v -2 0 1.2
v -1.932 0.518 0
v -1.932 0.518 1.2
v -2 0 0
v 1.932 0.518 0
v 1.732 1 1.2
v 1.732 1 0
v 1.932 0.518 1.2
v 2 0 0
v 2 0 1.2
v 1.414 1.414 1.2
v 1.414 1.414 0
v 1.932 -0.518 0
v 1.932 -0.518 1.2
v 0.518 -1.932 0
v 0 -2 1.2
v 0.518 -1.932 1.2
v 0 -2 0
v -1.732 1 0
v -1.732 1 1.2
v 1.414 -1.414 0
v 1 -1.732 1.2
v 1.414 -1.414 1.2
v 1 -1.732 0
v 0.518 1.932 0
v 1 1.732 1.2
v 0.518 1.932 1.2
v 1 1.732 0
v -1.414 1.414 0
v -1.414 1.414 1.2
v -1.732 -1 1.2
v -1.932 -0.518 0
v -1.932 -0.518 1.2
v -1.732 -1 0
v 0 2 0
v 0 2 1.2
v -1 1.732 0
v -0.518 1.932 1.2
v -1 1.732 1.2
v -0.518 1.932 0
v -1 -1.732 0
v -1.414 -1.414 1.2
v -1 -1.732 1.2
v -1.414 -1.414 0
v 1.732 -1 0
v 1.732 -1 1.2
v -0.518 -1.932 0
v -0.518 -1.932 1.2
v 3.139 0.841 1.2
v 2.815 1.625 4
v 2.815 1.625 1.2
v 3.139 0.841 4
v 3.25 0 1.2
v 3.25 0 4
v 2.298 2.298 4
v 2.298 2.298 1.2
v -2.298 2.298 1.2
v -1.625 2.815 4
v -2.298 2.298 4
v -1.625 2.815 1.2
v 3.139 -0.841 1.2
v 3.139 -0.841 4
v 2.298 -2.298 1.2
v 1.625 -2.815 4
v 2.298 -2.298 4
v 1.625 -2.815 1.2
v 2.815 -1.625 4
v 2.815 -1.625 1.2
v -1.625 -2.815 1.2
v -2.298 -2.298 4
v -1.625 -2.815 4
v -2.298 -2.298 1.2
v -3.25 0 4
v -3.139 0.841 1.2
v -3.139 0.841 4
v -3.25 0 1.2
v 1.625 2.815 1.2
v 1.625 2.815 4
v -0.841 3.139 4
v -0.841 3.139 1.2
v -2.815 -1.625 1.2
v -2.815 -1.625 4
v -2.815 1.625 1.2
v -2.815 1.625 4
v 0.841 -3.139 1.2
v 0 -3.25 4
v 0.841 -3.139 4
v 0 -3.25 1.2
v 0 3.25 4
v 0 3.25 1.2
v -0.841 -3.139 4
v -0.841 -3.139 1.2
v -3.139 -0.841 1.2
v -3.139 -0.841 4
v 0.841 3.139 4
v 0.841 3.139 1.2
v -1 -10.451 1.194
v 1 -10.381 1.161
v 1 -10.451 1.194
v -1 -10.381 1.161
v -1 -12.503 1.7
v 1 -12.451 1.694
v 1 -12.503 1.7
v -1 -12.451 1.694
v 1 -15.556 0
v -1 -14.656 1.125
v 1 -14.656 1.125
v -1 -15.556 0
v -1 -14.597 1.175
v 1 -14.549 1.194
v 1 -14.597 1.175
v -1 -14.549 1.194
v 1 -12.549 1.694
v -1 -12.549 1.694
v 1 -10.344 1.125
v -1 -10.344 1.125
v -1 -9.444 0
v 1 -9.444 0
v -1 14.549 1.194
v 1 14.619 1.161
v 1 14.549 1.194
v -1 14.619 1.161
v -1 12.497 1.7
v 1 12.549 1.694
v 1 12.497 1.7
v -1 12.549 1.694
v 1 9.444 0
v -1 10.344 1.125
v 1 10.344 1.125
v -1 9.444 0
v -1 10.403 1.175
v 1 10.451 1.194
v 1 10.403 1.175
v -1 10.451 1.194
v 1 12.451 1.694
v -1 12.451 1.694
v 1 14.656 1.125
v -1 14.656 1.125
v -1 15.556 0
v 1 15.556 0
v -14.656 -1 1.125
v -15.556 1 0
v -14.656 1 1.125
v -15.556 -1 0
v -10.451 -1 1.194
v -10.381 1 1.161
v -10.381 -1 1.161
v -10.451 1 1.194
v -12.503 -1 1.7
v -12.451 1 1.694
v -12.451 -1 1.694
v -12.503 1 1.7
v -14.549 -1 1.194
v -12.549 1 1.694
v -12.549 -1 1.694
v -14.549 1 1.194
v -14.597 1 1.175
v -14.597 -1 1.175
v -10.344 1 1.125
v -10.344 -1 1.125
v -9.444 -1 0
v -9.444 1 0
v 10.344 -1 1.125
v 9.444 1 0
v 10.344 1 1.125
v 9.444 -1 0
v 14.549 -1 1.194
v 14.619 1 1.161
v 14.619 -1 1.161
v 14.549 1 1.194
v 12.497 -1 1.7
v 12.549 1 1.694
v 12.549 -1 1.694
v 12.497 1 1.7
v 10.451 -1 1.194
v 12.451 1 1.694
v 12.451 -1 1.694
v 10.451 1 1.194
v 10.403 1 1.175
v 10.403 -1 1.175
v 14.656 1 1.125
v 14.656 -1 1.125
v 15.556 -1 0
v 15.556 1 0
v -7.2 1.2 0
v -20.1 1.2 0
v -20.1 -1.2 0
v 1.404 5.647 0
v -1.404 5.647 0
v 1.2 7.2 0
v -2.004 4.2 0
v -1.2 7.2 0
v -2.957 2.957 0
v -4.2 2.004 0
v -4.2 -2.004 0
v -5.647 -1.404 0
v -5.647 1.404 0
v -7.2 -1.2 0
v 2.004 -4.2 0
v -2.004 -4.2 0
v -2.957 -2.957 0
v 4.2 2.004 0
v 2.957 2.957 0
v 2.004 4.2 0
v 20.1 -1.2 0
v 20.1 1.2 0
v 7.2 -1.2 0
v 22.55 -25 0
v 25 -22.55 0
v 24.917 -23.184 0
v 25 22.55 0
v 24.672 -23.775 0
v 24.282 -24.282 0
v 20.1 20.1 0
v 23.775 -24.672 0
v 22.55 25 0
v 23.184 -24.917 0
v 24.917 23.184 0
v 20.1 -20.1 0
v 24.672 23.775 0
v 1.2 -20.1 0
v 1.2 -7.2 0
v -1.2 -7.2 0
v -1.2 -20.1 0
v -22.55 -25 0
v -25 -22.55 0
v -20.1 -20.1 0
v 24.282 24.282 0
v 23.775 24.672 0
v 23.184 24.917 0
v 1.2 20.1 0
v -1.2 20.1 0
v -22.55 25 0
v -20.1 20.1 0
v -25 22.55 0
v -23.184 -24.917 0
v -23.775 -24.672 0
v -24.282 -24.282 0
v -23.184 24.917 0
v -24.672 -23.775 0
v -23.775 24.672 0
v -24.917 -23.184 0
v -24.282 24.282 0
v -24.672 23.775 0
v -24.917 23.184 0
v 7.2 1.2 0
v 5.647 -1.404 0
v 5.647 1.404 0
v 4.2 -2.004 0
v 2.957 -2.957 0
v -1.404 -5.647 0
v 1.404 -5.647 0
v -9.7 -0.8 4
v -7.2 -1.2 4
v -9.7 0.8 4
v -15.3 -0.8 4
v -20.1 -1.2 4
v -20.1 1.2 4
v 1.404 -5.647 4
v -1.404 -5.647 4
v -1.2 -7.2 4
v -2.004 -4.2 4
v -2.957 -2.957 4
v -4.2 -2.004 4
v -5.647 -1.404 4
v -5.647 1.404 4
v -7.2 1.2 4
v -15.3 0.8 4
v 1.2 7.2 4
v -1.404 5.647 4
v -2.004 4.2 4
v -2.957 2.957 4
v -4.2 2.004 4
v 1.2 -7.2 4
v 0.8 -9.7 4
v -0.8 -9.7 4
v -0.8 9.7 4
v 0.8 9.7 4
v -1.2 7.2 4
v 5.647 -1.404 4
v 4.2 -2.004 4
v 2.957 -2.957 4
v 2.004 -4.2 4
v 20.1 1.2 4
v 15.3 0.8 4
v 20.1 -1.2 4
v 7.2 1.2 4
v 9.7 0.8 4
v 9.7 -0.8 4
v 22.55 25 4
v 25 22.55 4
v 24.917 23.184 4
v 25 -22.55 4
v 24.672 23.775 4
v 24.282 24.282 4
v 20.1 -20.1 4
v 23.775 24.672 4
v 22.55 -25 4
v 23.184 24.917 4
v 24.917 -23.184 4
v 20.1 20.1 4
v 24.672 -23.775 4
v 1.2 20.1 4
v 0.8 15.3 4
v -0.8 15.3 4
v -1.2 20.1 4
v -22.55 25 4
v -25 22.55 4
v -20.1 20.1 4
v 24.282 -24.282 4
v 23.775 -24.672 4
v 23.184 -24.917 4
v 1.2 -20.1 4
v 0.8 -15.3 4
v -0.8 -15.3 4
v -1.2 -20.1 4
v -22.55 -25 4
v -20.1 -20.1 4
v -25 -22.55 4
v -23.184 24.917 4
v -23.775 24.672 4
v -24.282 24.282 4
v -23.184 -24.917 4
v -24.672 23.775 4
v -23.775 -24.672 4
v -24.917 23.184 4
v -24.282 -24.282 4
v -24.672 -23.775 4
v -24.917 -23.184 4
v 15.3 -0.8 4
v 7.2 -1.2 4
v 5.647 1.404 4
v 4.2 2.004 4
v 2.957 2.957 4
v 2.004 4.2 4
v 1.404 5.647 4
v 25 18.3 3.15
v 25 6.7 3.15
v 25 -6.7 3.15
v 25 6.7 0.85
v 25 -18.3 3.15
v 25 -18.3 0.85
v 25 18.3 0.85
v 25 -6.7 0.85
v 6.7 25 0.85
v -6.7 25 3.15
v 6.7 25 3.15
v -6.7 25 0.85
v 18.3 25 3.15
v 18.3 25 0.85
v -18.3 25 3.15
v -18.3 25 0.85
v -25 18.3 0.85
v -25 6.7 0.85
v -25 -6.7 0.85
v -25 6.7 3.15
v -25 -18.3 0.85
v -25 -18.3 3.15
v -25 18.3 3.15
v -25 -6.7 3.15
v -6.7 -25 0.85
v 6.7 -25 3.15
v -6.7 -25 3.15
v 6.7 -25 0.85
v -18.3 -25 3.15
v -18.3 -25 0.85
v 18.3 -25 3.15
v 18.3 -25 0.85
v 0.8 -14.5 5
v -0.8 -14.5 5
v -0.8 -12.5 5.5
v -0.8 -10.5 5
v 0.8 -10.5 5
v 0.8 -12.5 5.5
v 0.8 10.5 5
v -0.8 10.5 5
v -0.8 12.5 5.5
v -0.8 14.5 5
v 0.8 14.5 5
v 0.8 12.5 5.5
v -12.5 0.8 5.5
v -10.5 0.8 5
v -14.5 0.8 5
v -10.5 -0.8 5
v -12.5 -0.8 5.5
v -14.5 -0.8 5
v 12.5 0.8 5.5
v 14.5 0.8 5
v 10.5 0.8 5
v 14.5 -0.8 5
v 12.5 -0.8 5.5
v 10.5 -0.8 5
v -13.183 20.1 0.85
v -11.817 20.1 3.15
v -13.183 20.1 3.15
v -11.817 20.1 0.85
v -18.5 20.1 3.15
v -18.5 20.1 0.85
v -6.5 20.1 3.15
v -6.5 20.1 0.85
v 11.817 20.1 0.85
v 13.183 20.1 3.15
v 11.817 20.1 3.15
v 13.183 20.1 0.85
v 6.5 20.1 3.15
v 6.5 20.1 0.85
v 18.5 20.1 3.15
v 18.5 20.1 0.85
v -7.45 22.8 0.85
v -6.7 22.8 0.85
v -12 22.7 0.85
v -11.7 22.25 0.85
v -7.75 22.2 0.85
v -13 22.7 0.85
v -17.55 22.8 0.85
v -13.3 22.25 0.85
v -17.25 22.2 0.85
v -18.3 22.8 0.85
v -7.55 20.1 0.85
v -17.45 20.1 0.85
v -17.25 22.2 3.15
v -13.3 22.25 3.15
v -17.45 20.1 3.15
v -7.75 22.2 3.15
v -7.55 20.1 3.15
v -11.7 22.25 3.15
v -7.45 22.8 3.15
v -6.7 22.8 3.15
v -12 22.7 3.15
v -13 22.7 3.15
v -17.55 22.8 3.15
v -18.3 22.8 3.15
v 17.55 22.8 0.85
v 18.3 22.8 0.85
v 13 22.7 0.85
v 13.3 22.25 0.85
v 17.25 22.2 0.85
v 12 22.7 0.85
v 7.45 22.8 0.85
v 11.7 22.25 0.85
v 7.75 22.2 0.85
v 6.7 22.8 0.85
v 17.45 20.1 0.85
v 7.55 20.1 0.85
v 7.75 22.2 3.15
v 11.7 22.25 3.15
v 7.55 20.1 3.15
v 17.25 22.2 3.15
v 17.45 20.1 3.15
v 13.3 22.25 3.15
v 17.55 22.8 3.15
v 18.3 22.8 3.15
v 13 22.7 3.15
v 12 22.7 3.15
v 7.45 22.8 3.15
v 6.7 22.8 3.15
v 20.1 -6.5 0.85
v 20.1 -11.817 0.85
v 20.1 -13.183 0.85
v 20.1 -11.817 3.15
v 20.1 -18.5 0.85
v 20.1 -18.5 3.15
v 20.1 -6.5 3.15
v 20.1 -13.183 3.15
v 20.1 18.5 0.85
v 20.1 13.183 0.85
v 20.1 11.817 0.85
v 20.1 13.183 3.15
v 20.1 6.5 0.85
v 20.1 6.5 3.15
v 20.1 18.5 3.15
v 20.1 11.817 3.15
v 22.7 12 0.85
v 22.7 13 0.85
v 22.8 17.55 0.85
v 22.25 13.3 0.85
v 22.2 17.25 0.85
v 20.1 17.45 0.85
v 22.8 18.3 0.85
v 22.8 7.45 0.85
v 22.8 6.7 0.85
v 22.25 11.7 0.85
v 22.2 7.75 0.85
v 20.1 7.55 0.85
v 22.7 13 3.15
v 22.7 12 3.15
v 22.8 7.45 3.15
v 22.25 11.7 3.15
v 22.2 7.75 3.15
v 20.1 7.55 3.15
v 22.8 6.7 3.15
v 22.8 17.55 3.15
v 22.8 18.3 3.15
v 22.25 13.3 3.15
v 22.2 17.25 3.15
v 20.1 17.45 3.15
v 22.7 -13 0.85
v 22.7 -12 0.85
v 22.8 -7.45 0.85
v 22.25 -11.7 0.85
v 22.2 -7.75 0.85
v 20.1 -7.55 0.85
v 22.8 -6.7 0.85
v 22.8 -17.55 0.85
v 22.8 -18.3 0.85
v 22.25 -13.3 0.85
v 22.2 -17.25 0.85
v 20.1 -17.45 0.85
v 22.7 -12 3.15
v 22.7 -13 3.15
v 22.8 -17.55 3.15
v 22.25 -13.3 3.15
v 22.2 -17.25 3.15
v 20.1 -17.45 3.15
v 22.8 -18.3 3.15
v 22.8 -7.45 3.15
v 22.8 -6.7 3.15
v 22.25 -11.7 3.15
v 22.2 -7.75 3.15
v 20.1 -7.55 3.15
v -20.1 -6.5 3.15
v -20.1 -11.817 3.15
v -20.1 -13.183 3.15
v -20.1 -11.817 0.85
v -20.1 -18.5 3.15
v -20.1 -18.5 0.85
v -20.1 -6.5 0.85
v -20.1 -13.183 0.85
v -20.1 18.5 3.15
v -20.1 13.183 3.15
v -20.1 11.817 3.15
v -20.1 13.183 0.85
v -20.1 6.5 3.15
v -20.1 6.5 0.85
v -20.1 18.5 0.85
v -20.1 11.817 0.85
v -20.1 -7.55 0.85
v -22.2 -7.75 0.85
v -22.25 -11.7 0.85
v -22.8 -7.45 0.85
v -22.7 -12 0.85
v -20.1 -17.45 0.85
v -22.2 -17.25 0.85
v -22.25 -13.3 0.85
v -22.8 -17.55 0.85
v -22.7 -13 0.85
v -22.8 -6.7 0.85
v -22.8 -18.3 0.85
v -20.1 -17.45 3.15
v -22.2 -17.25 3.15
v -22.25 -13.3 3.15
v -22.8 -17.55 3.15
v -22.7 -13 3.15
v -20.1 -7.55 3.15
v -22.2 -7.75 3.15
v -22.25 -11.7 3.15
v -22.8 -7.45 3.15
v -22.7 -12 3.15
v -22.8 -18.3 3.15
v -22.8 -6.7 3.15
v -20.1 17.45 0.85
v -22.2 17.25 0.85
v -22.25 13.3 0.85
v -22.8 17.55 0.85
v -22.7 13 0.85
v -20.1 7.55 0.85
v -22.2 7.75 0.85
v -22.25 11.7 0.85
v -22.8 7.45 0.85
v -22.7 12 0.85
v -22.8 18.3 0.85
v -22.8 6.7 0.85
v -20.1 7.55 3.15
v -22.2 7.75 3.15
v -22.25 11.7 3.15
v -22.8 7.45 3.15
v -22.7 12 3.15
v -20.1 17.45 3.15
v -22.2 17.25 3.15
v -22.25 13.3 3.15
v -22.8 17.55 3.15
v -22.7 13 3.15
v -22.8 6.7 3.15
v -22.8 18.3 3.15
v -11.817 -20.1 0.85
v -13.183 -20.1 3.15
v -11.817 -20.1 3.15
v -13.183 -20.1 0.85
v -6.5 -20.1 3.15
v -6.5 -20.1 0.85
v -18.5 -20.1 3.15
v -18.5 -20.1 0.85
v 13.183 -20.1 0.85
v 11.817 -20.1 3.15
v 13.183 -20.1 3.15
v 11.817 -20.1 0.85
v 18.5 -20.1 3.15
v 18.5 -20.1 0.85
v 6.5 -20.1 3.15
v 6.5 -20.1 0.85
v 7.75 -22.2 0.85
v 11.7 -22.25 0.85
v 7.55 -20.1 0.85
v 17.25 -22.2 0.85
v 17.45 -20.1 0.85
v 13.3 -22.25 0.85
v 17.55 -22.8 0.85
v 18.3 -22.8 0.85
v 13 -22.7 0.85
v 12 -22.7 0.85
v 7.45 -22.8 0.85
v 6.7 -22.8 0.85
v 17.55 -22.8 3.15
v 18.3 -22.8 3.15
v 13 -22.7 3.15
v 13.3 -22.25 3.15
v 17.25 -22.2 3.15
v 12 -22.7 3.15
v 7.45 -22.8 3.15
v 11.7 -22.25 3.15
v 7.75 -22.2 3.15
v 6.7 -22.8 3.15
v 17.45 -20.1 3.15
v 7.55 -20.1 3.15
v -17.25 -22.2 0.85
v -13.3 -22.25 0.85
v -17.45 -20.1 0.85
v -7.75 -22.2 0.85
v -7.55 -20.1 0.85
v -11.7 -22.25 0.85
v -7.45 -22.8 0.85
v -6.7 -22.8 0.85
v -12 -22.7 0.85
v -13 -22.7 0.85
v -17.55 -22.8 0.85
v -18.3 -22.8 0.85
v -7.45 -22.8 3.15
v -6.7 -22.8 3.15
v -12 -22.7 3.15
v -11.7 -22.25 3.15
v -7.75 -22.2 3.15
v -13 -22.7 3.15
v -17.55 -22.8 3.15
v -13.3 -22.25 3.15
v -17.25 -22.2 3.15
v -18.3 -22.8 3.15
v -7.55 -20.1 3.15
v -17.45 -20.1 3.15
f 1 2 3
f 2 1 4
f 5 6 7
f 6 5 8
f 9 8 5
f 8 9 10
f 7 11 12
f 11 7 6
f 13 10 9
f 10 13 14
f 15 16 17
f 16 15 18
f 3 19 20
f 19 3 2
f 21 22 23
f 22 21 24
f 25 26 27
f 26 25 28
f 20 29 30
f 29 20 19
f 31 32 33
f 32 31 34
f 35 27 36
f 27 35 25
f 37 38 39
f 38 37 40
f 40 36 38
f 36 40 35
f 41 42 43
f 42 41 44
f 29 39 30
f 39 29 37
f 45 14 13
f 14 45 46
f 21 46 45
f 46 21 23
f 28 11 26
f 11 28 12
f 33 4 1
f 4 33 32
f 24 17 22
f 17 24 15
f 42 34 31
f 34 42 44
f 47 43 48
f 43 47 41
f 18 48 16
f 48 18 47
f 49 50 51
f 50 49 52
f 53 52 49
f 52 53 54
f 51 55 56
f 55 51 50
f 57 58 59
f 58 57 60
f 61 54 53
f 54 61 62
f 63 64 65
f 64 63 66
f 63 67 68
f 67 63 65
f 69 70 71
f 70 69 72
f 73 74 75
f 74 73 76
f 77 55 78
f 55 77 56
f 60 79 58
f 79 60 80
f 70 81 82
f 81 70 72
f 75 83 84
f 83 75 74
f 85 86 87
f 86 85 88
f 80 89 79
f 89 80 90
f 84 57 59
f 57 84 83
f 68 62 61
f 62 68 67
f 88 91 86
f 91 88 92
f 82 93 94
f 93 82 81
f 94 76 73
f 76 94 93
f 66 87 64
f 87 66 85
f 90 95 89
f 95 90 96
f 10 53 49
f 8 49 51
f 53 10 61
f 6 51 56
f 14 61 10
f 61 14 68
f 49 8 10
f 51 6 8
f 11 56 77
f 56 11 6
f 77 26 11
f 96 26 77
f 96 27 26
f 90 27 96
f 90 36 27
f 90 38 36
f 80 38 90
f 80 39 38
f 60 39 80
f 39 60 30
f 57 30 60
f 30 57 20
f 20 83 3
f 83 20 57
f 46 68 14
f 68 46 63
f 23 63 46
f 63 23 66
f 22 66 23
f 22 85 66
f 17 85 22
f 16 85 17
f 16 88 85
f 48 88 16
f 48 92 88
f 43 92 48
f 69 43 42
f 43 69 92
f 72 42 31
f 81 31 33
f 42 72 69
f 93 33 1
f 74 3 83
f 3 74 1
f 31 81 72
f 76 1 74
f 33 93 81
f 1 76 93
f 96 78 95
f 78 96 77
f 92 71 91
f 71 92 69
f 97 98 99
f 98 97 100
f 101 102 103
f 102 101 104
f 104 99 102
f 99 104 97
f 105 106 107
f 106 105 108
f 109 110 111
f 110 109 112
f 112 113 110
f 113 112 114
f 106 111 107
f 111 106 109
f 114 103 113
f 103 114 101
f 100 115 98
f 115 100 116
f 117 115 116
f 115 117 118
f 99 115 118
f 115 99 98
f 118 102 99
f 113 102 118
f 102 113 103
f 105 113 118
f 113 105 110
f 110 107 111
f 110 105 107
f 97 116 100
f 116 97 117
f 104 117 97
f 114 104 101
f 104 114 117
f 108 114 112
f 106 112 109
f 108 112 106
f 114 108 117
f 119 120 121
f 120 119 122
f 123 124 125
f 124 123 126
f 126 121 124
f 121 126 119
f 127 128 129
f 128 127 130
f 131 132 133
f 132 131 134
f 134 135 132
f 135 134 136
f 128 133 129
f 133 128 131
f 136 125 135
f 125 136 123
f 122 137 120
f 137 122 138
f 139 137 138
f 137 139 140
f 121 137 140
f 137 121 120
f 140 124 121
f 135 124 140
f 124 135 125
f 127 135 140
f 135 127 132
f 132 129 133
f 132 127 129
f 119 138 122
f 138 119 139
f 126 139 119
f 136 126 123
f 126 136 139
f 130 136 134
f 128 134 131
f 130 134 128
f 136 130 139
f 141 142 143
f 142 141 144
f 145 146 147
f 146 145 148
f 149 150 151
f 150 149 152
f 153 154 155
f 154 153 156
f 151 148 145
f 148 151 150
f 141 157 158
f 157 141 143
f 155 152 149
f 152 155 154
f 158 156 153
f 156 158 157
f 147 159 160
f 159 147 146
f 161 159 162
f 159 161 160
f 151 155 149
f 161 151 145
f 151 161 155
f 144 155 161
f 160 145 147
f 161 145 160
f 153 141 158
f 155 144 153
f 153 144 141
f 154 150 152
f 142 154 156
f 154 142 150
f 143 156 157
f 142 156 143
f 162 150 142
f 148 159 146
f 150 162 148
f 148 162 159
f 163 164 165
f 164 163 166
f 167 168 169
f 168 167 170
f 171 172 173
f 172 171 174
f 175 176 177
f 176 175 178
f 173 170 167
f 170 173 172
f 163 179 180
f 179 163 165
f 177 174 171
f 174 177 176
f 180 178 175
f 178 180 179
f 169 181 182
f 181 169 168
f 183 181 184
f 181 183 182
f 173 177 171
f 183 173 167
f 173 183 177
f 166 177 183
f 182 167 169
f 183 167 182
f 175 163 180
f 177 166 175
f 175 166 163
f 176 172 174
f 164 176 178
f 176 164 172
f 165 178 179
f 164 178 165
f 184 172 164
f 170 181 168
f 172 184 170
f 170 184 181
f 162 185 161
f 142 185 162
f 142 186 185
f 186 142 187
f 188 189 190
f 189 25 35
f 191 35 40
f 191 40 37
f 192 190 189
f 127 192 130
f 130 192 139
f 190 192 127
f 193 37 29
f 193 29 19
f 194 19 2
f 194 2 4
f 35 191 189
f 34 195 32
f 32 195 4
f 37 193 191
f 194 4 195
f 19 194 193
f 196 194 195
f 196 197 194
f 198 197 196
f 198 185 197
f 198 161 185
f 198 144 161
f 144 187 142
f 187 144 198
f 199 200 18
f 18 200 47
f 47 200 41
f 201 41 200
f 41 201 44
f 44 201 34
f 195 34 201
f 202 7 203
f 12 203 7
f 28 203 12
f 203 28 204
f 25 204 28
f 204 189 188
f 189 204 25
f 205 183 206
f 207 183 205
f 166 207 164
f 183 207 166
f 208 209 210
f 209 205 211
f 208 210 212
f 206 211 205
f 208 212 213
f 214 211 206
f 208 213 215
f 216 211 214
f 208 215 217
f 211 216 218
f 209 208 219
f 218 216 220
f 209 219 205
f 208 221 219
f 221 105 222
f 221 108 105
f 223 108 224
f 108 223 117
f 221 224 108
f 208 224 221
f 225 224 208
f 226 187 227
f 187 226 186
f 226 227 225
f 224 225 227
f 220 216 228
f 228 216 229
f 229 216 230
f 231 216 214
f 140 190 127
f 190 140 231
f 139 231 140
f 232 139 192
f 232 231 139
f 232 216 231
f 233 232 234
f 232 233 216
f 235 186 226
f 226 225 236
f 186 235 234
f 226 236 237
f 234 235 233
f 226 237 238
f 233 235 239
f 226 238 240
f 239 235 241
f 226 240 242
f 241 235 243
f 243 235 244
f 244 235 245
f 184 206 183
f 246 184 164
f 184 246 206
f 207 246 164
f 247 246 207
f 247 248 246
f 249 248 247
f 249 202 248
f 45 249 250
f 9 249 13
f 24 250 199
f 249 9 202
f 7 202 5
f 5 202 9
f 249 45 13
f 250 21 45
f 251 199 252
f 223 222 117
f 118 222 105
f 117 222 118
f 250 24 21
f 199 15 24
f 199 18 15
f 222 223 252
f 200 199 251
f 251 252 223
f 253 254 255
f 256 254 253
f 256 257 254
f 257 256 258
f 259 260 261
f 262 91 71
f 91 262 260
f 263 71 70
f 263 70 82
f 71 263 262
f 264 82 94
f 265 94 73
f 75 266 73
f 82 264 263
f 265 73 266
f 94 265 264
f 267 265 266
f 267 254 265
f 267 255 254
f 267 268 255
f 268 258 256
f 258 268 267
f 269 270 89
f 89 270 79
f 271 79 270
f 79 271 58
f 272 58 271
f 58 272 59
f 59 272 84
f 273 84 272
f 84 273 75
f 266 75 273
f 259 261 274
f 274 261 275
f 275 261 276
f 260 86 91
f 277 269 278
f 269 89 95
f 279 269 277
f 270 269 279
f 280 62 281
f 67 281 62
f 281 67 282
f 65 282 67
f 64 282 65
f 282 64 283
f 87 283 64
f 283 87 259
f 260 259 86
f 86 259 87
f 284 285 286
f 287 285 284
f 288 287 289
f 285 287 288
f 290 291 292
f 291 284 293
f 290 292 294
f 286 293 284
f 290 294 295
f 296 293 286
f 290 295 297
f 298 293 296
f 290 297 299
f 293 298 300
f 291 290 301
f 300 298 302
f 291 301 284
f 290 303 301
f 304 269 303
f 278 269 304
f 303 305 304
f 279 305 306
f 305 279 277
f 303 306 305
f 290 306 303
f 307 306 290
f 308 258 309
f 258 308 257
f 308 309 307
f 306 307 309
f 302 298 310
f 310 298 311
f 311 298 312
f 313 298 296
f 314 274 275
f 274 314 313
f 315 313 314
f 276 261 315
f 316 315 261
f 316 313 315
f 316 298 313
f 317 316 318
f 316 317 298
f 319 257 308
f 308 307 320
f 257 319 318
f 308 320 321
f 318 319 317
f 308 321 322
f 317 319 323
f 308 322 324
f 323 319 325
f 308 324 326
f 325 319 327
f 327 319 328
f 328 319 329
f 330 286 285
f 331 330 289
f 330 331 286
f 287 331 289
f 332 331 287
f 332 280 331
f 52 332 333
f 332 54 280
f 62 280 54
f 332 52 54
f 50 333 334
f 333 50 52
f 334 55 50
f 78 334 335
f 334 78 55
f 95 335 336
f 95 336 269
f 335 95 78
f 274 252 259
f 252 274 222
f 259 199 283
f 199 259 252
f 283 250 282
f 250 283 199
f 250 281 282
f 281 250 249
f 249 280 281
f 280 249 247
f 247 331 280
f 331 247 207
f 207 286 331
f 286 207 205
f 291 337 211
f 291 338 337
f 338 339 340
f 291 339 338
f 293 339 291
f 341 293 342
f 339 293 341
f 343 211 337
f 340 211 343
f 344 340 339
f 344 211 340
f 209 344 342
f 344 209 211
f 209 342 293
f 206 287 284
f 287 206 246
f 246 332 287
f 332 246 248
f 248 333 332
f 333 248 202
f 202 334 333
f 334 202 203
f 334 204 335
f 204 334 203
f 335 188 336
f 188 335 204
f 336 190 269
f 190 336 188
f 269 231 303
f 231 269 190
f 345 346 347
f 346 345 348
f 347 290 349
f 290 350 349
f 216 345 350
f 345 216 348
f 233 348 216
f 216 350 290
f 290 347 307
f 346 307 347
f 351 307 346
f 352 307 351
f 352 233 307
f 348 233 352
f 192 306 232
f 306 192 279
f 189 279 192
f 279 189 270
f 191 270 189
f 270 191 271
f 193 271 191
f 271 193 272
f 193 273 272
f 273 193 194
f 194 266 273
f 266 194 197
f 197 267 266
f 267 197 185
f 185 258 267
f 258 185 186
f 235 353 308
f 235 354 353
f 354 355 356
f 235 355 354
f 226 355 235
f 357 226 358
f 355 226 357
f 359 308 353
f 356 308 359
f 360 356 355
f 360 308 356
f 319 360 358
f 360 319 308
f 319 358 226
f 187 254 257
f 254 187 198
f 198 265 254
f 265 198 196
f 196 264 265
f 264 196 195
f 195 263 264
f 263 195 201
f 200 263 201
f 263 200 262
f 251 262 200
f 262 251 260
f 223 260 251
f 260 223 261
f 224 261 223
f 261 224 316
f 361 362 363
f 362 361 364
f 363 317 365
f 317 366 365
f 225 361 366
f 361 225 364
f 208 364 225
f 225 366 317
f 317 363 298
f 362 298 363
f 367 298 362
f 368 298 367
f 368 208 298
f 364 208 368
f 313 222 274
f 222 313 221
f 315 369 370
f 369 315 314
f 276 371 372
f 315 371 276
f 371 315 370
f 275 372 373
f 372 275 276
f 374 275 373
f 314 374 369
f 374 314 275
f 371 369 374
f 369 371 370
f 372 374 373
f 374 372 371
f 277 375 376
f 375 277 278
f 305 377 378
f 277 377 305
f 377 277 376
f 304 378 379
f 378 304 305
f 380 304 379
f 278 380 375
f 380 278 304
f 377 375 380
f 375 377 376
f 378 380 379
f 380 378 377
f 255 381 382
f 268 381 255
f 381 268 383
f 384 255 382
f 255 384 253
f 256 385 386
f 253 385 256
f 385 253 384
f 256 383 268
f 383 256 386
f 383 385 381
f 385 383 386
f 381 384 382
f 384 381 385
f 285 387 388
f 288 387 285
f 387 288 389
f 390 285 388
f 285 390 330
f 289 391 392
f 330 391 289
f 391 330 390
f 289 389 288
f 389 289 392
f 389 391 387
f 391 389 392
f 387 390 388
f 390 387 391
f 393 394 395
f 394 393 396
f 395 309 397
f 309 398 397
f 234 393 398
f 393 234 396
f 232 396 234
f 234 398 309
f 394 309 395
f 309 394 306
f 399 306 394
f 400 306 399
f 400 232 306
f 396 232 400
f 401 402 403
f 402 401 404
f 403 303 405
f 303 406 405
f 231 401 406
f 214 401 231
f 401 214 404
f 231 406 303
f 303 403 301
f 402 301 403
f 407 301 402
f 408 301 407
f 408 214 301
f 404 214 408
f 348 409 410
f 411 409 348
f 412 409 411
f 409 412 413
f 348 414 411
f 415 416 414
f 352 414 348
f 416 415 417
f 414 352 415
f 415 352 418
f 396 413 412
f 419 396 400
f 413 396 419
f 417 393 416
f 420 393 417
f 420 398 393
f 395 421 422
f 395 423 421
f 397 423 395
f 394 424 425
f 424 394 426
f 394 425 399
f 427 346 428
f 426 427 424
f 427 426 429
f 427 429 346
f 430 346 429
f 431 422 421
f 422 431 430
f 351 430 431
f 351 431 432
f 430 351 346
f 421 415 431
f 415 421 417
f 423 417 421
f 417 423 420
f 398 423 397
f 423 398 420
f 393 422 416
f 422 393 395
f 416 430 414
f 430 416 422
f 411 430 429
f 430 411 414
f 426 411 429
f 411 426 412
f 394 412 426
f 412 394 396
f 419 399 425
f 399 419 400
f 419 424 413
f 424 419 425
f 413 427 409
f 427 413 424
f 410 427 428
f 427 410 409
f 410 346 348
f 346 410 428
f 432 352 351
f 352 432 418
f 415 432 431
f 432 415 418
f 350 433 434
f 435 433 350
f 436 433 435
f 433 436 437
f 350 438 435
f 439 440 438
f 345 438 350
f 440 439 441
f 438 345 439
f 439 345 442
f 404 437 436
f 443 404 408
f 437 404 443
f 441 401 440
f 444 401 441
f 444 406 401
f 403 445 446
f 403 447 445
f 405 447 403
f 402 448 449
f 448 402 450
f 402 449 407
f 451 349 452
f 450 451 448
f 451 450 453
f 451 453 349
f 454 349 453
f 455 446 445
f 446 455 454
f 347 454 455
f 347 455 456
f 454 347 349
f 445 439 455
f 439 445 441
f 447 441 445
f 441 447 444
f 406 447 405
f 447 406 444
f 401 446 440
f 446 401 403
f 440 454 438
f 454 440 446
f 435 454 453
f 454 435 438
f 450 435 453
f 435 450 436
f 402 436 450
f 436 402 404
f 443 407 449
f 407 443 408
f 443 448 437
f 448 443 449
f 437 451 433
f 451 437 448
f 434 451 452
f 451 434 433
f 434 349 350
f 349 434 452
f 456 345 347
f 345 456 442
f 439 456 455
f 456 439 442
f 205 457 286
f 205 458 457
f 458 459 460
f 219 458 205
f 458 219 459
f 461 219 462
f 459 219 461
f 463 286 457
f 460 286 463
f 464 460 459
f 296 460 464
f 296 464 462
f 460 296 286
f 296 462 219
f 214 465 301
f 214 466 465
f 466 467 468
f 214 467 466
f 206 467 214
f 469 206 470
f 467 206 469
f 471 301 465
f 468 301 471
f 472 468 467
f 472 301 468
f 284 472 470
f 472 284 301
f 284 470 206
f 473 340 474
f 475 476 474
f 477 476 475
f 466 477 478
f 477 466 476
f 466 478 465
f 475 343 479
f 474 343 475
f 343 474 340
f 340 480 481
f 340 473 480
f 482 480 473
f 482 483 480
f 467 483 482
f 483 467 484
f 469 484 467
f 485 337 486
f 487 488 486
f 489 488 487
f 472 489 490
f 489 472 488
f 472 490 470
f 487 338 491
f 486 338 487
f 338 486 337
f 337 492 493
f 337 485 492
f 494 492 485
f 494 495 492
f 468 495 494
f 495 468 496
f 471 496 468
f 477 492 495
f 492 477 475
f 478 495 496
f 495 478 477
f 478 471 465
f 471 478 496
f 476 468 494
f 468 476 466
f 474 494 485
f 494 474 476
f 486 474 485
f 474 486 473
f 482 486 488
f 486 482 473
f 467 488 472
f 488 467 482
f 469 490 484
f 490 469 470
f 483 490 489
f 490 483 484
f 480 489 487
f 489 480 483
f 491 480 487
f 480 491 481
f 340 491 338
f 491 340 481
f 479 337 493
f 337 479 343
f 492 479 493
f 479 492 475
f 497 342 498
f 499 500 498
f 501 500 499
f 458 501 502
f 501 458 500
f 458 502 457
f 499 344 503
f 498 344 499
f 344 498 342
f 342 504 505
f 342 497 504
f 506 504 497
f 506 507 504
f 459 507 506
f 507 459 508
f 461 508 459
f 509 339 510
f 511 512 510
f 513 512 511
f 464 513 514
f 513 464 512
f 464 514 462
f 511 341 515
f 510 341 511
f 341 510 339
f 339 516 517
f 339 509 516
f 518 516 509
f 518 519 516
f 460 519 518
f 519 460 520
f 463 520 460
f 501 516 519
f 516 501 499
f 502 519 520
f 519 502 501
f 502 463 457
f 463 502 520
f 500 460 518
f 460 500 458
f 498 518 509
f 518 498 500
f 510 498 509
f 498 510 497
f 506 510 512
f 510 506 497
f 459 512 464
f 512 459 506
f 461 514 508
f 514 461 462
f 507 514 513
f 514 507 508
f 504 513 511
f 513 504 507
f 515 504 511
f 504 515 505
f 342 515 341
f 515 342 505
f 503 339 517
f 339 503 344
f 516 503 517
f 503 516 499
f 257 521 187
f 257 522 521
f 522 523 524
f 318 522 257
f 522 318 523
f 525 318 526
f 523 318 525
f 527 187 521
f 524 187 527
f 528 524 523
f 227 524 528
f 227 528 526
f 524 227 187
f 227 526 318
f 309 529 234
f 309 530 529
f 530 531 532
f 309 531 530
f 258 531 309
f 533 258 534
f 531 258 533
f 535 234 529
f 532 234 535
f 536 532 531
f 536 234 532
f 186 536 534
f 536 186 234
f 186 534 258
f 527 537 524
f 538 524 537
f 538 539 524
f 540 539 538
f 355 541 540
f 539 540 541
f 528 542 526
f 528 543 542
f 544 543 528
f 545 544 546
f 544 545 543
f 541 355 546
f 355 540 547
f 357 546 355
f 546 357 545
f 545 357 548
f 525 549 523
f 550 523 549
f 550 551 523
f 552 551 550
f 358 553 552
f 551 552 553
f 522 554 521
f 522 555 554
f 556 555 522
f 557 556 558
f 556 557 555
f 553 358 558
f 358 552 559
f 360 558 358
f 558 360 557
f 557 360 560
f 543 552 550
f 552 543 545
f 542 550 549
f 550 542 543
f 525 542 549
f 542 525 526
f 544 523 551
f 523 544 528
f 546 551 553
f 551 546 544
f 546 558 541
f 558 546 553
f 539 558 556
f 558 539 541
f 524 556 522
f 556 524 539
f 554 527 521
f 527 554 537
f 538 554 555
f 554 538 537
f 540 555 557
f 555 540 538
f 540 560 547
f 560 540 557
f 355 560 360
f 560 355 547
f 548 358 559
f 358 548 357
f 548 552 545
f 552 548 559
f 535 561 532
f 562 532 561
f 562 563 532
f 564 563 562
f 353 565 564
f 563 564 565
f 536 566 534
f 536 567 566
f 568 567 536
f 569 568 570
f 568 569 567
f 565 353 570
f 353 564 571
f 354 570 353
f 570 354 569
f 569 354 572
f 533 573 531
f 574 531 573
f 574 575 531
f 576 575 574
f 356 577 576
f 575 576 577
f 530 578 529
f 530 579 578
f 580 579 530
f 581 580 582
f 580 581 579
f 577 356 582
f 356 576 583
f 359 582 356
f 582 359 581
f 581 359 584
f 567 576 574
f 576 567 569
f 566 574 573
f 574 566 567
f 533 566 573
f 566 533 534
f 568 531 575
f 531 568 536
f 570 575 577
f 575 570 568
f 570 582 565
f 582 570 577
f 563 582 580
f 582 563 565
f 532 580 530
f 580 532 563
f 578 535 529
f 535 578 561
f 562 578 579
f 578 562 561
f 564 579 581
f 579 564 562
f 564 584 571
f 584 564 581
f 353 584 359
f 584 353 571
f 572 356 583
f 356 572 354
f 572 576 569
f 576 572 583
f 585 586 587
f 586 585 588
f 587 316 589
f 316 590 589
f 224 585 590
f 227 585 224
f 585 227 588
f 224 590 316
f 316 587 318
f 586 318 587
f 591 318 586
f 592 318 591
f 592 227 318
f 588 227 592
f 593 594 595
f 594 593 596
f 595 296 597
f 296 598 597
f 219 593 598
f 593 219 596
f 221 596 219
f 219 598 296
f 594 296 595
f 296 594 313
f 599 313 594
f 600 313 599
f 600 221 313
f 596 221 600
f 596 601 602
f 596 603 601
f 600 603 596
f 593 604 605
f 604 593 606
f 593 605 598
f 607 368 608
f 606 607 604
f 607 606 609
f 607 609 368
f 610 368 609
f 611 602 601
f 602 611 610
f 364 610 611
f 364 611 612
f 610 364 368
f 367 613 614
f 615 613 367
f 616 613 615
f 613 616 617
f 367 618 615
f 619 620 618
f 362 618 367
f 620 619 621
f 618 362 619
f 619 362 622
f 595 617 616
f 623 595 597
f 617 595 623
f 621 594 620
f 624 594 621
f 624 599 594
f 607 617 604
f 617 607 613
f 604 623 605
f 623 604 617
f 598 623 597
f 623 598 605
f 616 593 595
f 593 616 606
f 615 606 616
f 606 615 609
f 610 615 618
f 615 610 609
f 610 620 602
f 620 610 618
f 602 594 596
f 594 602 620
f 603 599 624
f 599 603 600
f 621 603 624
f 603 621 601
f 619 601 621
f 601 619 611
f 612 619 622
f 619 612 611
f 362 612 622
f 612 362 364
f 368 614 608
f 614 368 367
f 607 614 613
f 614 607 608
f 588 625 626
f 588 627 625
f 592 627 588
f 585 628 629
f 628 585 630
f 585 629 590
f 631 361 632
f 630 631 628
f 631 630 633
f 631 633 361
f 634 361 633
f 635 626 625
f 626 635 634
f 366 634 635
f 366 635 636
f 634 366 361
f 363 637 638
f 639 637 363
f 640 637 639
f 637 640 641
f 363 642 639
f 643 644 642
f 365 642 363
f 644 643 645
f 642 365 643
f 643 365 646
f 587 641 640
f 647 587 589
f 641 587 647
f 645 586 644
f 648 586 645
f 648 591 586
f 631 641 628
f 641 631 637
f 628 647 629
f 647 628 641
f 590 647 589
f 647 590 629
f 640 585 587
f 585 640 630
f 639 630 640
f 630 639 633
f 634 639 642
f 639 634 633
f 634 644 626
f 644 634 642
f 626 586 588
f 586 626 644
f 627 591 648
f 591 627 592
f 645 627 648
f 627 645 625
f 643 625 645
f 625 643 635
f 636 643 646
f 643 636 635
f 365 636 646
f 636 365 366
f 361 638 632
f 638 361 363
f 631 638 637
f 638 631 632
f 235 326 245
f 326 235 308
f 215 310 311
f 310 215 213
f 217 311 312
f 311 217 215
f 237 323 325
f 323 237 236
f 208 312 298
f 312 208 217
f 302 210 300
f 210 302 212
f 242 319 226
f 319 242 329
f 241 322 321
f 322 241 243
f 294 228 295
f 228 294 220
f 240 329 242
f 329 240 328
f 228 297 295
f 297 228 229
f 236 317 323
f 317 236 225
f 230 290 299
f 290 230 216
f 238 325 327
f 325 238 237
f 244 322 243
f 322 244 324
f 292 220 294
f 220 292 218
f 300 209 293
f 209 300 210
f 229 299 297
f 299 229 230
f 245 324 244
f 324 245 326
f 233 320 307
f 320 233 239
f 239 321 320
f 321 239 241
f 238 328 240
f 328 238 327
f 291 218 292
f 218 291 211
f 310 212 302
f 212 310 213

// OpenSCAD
// file: girl/girl_lock.scad
// Copyright 2025 Natalie Baker // Apache v2 //

include<girl_common.scad>;

girl_lock();

//color("blue")
//translate([0,0,-1]) 
//girl_slot();

module girl_lock() {
	$fn=12;
	linear_extrude(lock_height, center=true)
	mirror_copy([0,1])
	mirror_copy([1,0])
	_girl_lock_part();
}

module girl_slot() {
	$fn=12;
	linear_extrude(lock_height+0.4, center=true)
	mirror_copy([0,1])
	mirror_copy([1,0])
	_girl_slot_part();
}

module _girl_slot_part() {
	polygon([
		[           0,      0.00],
		[lock_width/2+0.30, 0.00],
		[lock_width/2+0.30, 2.20],
		[lock_width/2-0.45, 2.20],
		[lock_width/2-0.75, 2.80],
		[lock_width/2-0.55, lock_depth],
		[lock_width/2+0.50, lock_depth],
		[lock_width/2+0.50, 8.25],
		[lock_width/2-5.00, 8.25],
		[lock_width/2-4.70, 2.75],
		[lock_width/2-5.00, 2.30],
		[           0,      2.30],
	]);
}

module _girl_lock_part() {
	difference() {
		polygon([
			[           0,      0.00],
			[lock_width/2,      0.00],
			[lock_width/2,      2.00],
			[lock_width/2-0.95, 2.00],
			[lock_width/2-0.60, lock_depth+0.1],
			[lock_width/2,      lock_depth+0.1],
			[lock_width/2-0.30, 6.20],
			[lock_width/2-2.15, 7.65],
			[lock_width/2-2.60, 7.90],
			[lock_width/2-3.00, 8.00],
			[lock_width/2-3.40, 7.90],
			[lock_width/2-3.60, 7.70],
			[lock_width/2-3.70, 7.45],
			[lock_width/2-3.25, 2.00],
			[           0,      2.00],
		]);
		polygon([
			[lock_width/2-2.10, 1.00],
			[lock_width/2-1.60, 5.50],
			[lock_width/2-2.50, 6.50],
			[lock_width/2-2.20, 1.00],
		]);
	}
}

module mirror_copy(m) {
	mirror(m) children();
	children();	
}
// file: girl/girl_common.scad
// Copyright 2025 Natalie Baker // Apache v2 //

base_size  = 32;
wall_width =  9;

magnet_dia    = 6.2;
magnet_height = 2.8;

lock_height   = 1.9;
lock_depth    = 4.9;
lock_width    = 11;

lock_hole_dia = 2.25;

grid_size   = base_size + 2*wall_width;
grid_diag   = sqrt(2*grid_size*grid_size);
grid_height = max(lock_height, magnet_height)+1.2;

frame_size = 2.4;

module repeat(size, x, y, z, center) {
	off = center 
		? [(x-1)*size[0],(y-1)*size[1],(z-1)*size[2]]/2 
		: [0,0,0];

	for(i = [0 : x-1])
	for(j = [0 : y-1])
	for(k = [0 : z-1])
		translate([
			size[0]*i-off[0],
			size[1]*j-off[1],
			size[2]*k-off[2]
		]) children();
}
// file: girl/girl_grid.scad
// Copyright 2025 Natalie Baker // Apache v2 //

include<girl_common.scad>;
use<girl_lock.scad>;

grid_grid_map([[1]]);

module grid_grid_map(m) {

	for(y = [0:len(m)-1]) {
		for(x = [0:len(m[y])-1]) {
			translate([x*grid_size, y*grid_size])
			if (m[y][x]) {
				
				tile_px = m[y][x+1] == 1;
				tile_nx = m[y][x-1] == 1;
				tile_py = m[y+1][x] == 1;
				tile_ny = m[y-1][x] == 1;
				
				air_px = m[y][x+1] != 1;
				air_nx = m[y][x-1] != 1;
				air_py = m[y+1][x] != 1;
				air_ny = m[y-1][x] != 1;
				
				air_pxpy = m[y+1][x+1] != 1;
				air_pxny = m[y-1][x+1] != 1;
				air_nxpy = m[y+1][x-1] != 1;
				air_nxny = m[y-1][x-1] != 1;
				
				girl_grid_section(air_px, air_py, air_nx, air_ny);
				
				linear_extrude(grid_height)
				union() {
					if (tile_px && air_pxpy) {
						translate([grid_size/2, (grid_size-lock_depth)/2])
						square([lock_depth*2, lock_depth], center=true);
					}
						
					if (tile_px && air_pxny) {
						translate([grid_size/2, -(grid_size-lock_depth)/2])
						square([lock_depth*2, lock_depth], center=true);
					}
					
					// -- //
				
					if (tile_nx && air_nxpy) {
						translate([-grid_size/2, (grid_size-lock_depth)/2])
						square([lock_depth*2, lock_depth], center=true);
						
					}
						
					if (tile_nx && air_nxny) {
						translate([-grid_size/2, -(grid_size-lock_depth)/2])
						square([lock_depth*2, lock_depth], center=true);
					}
					
					// -- //
				
					if (tile_py && air_pxpy) {
						translate([(grid_size-lock_depth)/2, grid_size/2])
						square([lock_depth, lock_depth*2], center=true);
					}
				
					if (tile_py && air_nxpy) {
						translate([-(grid_size-lock_depth)/2, grid_size/2])
						square([lock_depth, lock_depth*2], center=true);
					}
					
					// -- //
					
					if (tile_ny && air_pxny) {
						translate([(grid_size-lock_depth)/2, -grid_size/2])
						square([lock_depth, lock_depth*2], center=true);
					}
						
					if (tile_ny && air_nxny) {
						translate([-(grid_size-lock_depth)/2, -grid_size/2])
						square([lock_depth, lock_depth*2], center=true);
					}
				}
			}
		}
	}
	
}

module girl_grid_section(x_p, y_p, x_n, y_n) {
	$fn=24;
	intersection() {
		union() {
			_girl_grid_single();
			
			if (x_p)
			rotate(270)
			translate([0,grid_size/2])
			_girl_grid_slots();
			
			if (x_n)
			rotate(90)
			translate([0,grid_size/2])
			_girl_grid_slots();
			
			if (y_p)
			translate([0,grid_size/2,0])
			_girl_grid_slots();
			
			if (y_n)
			rotate(180)
			translate([0,grid_size/2,0])
			_girl_grid_slots();
		}
			
		linear_extrude(grid_height+100)
		offset( lock_depth/2)
		offset(-lock_depth/2)
		square([grid_size,grid_size],center=true);
	}
}


module _girl_grid_slots() {

	difference() {
		translate([-grid_size/2,-lock_depth,0])
			cube([grid_size,lock_depth,grid_height]);

		translate([-grid_size/4,0,grid_height/2])
			girl_slot();

		translate([grid_size/4,0,grid_height/2])
			girl_slot();
	}
		
}

module _girl_grid_single() {
	union() {
		render()
		difference() {
			linear_extrude(grid_height)
			intersection() {
				repeat([grid_diag/2,grid_diag/2,1], 2, 2, 1, true)
					_girl_grid_lattice(grid_diag/2, frame_size, 6.0);
				square(grid_size, center=true);
			}
			
			_girl_grid_magnet_hole();
			_girl_grid_key(frame_size/3*2,  0.2);
		}
		
		translate([0,0,grid_height])
		_girl_grid_key(frame_size/3*2);
	}
}

module _girl_grid_magnet_hole(tolerance=0.15) {
	mad_d = magnet_dia+2*tolerance;
	mag_h = magnet_height+2*tolerance;
	
	translate([0,0,-tolerance])
	cylinder(d=4, h=grid_height-magnet_height+2*tolerance);
	
	translate([0,0,grid_height-magnet_height])
	cylinder(d=mad_d, h=mag_h);
}

module _girl_grid_lattice(size, wall, radius) {
	intersection() {
		offset(-radius)
		offset( radius)
		union() {
			difference() {
				square(size*26, center=true);
				square(size-wall, center=true);
			}
		}
		square(size, center=true);
	}
}

module _girl_grid_key(wall, tolerance=0) {
	translate([0,-grid_size/4,0])
	rotate([0,0,90])
	_girl_grid_key_single(wall, tolerance);

	translate([0,grid_size/4,0])
	rotate([0,0,90])
	_girl_grid_key_single(wall, tolerance);

	translate([-grid_size/4,0,0])
	_girl_grid_key_single(wall, tolerance);

	translate([grid_size/4,0,0])
	_girl_grid_key_single(wall, tolerance);
}

module _girl_grid_key_single(wall, tolerance=0) {
	rotate([90,0,0])
	translate([0,0,-wall/2-tolerance])
	linear_extrude(wall+2*tolerance)
	offset(tolerance)
	polygon([
		[ 0.00,-0.25],
		[ 3.00,-0.25],
		[ 2.00, 1.00],
		[ 0.00, 1.50],
		[-2.00, 1.00],
		[-3.00,-0.25]
	]);
}
// main file
// Copyright 2025 Natalie Baker // Apache v2 //

use<girl/girl_grid.scad>;

grid_grid_map([[1]]);
